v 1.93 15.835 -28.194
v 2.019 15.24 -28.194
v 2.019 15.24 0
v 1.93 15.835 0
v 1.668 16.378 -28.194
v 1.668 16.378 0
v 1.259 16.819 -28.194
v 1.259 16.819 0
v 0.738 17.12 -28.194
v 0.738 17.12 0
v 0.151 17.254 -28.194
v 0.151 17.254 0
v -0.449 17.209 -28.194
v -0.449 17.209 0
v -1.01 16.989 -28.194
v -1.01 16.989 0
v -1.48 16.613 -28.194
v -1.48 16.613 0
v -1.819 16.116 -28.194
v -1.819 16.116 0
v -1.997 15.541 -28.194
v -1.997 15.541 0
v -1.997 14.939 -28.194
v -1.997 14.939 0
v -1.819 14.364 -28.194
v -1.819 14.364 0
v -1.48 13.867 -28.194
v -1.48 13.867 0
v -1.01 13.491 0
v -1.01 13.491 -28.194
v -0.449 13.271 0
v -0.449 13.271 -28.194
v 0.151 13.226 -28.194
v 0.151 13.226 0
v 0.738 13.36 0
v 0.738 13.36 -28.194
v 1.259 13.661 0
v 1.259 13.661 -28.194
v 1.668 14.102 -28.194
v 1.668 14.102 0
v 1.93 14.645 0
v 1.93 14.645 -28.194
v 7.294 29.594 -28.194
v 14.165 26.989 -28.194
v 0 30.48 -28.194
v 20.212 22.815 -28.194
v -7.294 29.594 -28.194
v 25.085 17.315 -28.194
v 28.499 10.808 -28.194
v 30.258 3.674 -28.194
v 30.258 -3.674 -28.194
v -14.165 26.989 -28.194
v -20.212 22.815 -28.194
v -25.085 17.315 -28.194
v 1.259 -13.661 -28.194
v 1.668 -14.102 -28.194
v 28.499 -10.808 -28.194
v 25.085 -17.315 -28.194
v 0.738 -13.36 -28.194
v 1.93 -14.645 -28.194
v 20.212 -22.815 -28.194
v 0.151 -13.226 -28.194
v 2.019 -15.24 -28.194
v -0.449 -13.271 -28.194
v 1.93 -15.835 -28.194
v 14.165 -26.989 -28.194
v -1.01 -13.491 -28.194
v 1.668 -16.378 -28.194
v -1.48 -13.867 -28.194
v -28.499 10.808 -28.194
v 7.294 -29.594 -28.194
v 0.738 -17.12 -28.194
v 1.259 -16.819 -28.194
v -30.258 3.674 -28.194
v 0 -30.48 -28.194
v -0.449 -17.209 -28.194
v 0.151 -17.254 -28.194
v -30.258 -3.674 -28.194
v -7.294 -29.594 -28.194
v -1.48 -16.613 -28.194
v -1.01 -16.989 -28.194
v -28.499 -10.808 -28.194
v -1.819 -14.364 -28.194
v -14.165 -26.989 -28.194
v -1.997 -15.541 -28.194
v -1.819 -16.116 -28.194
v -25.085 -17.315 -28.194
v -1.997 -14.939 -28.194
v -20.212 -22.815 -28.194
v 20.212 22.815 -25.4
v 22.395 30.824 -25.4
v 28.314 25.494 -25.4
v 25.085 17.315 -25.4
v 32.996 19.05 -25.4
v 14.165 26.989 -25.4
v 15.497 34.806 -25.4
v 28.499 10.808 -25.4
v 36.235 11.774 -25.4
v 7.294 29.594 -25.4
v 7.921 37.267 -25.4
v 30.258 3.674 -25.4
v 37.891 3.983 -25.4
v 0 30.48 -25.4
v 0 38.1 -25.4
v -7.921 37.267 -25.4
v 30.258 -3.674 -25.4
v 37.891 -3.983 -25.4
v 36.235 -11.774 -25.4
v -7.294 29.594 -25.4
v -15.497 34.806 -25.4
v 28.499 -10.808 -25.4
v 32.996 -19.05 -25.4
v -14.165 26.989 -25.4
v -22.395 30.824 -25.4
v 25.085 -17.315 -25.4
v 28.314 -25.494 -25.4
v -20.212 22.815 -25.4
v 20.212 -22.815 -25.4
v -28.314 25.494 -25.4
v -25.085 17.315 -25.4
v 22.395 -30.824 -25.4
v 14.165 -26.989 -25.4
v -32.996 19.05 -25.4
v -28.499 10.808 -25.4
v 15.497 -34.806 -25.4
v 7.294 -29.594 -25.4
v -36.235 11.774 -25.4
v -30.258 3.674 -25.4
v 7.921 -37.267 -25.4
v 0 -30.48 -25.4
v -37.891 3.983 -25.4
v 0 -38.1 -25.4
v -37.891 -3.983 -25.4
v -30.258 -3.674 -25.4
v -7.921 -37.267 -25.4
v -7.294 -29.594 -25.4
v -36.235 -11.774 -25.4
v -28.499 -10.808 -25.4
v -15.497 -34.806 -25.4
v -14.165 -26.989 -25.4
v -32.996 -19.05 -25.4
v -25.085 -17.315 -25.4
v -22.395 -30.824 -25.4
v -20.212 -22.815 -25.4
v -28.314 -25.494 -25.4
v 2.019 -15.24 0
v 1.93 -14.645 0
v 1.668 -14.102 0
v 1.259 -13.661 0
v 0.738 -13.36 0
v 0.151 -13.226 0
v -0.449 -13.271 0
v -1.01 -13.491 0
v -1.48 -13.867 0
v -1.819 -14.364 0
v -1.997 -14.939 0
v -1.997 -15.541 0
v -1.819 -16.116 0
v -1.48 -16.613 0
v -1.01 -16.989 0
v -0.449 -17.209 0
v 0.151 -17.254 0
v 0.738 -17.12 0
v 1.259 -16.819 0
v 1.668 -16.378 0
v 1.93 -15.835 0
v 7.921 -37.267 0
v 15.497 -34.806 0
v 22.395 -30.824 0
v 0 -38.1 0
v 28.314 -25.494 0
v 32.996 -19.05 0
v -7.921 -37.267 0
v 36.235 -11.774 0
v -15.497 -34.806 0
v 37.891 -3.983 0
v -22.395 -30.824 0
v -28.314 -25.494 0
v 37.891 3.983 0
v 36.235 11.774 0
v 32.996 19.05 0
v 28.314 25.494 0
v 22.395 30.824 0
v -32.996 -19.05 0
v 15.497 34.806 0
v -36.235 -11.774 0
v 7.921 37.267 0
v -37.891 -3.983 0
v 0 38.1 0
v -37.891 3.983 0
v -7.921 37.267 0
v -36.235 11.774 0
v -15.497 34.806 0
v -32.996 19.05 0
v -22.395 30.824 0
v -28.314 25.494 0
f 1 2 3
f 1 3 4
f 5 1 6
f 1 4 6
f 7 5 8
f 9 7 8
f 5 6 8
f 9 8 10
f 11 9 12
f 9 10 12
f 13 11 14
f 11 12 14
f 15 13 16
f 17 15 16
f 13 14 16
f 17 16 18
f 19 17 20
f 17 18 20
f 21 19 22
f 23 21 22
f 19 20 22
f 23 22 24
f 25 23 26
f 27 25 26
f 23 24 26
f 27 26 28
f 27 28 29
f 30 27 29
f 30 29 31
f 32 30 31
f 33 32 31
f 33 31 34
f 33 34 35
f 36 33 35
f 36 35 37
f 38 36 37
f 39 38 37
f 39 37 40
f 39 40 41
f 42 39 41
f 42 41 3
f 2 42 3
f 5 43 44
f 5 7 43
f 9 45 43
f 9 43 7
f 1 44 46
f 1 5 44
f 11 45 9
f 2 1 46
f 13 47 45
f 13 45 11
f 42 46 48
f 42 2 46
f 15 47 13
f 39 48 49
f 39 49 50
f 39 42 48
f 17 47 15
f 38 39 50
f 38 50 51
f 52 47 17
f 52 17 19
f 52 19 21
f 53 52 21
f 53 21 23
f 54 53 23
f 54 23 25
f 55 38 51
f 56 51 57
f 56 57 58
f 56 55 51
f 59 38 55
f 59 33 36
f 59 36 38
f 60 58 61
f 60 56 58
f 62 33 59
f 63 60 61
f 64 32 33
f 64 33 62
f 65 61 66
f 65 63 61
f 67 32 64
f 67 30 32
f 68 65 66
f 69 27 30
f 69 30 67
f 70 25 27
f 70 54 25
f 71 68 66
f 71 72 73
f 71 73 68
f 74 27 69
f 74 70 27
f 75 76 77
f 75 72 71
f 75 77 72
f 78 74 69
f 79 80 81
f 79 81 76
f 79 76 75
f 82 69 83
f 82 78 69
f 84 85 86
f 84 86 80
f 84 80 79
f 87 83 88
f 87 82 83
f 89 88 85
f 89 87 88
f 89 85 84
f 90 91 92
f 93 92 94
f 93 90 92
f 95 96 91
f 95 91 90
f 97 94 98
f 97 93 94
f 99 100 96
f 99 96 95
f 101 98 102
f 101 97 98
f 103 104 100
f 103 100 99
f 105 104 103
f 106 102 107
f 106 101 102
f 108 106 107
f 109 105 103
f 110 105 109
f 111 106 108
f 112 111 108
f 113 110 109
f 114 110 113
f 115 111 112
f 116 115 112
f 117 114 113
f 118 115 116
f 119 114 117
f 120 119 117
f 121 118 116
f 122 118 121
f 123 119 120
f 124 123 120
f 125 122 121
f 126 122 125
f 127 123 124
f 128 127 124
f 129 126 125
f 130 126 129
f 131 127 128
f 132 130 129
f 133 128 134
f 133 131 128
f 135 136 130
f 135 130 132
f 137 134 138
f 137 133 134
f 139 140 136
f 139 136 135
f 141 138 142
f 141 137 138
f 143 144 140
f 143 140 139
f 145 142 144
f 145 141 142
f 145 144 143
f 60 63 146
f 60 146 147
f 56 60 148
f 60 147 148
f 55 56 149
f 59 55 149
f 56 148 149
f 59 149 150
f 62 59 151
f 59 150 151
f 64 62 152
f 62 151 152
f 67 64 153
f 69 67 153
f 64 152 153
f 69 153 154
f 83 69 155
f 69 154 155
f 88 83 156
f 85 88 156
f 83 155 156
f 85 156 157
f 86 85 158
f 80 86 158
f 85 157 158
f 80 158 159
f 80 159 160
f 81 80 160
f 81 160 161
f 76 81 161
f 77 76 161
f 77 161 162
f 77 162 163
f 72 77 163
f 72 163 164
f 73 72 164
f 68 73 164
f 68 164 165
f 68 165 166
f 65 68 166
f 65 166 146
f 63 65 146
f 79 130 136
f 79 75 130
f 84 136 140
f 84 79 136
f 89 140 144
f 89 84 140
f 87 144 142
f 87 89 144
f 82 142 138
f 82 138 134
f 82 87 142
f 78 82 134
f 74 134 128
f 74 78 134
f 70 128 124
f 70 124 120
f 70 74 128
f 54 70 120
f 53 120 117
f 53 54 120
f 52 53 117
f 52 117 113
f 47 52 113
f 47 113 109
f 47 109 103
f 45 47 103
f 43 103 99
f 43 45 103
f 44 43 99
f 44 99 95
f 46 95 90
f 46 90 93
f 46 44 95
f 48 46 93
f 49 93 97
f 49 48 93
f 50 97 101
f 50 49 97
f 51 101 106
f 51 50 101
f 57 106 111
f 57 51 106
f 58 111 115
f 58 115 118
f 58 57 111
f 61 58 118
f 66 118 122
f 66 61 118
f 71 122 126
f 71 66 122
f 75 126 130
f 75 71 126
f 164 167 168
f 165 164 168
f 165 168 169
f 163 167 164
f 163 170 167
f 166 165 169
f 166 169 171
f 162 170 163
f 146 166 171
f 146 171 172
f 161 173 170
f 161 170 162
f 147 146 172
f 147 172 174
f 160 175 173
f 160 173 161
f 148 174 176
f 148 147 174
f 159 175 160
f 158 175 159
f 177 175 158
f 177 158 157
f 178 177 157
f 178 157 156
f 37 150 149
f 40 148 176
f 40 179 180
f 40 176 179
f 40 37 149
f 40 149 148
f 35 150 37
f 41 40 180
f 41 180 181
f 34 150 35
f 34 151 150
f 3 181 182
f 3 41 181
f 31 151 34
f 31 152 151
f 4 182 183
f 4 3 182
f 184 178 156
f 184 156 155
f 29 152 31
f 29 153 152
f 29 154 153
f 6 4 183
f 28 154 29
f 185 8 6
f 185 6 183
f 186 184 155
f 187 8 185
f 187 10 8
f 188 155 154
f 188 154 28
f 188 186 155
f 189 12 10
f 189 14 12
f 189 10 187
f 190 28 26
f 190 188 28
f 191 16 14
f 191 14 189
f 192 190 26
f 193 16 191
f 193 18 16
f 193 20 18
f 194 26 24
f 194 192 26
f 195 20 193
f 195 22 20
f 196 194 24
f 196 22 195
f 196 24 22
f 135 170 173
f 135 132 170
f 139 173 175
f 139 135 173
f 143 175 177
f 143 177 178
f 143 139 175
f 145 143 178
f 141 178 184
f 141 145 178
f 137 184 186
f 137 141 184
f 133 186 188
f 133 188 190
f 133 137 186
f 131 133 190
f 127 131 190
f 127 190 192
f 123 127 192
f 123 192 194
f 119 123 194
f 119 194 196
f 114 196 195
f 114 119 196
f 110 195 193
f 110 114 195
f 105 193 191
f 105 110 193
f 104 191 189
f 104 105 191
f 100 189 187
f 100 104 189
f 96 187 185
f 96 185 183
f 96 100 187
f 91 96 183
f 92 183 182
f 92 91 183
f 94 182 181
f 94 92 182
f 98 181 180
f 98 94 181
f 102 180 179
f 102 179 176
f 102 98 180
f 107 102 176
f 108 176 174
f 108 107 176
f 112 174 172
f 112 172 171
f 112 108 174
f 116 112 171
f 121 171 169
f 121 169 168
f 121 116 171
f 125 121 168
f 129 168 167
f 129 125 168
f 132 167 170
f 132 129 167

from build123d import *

# Parameters (mm, degrees)
F_10_32_TAPPED_HOLE1_D = 4.0386


with BuildPart() as part:
    # Sketch1 → Revolve2 (revolve)
    with BuildSketch(Plane(origin=(0, 0, 0), x_dir=(0, 0, -1), z_dir=(1, 0, 0)), mode=Mode.PRIVATE) as revolve2_sk:
        Polygon((0, 38.1), (25.4, 38.1), (25.4, 30.48), (28.194, 30.48), (28.194, 0), (0, 0), align=None)
    revolve(revolve2_sk.sketch.rotate(Axis((0, 0, 0), (0, 0, -1)), 180), axis=Axis((0, 0, 0), (0, 0, -1)))

    # #10-32 Tapped Hole1 (through all)
    with Locations(Plane(origin=(0, 0, -28.194), x_dir=(-1, 0, 0), z_dir=(0, 0, -1))):
        with Locations((0, 15.24), (0, -15.24)):
            Hole(F_10_32_TAPPED_HOLE1_D / 2)


solid = part.part
